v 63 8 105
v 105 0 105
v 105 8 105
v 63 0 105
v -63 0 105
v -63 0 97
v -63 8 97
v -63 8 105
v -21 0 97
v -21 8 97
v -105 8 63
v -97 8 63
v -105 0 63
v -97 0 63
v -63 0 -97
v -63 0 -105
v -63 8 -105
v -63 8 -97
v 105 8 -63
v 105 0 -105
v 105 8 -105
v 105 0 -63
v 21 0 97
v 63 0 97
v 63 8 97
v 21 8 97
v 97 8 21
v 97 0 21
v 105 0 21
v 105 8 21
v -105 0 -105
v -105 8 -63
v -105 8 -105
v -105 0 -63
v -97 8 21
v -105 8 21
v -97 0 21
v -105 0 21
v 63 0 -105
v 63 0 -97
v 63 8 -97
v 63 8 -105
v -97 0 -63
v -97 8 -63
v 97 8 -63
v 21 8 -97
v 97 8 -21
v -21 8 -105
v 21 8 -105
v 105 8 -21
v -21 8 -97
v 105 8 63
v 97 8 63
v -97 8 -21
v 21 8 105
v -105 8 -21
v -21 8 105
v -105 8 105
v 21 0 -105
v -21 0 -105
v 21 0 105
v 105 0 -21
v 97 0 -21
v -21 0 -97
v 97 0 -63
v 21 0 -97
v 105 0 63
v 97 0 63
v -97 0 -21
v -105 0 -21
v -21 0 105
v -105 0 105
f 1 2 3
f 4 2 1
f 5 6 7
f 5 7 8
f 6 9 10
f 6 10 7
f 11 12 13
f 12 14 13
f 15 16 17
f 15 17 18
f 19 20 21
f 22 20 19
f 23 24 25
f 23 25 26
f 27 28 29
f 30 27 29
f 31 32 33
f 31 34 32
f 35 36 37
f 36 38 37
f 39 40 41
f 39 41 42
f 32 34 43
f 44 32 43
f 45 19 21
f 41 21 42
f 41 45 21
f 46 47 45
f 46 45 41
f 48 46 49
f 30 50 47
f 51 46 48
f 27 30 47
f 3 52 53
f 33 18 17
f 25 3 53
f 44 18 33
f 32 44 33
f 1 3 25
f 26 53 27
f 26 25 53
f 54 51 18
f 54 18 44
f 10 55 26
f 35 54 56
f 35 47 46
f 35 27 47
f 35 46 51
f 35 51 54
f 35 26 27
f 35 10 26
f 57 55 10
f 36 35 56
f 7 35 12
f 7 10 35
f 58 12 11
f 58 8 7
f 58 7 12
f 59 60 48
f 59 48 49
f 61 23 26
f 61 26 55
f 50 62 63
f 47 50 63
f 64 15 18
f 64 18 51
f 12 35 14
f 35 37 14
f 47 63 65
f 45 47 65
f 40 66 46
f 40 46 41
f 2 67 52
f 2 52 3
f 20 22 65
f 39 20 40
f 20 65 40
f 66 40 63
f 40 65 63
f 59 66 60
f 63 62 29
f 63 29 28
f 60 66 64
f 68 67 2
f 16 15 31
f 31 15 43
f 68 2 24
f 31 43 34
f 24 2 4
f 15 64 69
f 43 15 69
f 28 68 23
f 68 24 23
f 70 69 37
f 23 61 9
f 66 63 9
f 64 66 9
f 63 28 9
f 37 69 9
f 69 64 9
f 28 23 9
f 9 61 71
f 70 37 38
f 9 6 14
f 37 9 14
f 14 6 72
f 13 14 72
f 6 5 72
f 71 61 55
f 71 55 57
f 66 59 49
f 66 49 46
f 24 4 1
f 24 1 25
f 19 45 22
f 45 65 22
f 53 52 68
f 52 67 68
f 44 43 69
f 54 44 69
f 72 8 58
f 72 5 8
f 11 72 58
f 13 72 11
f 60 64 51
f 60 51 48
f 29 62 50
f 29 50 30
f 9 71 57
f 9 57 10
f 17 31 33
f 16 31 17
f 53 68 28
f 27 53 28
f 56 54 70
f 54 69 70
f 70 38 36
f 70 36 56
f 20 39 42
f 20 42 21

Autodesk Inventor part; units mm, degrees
ref_plane "YZ Plane" through (0, 0, 0) normal (1, 0, 0) x (0, 1, 0)
ref_plane "XZ Plane" through (0, 0, 0) normal (0, 1, 0) x (-1, 0, 0)
ref_plane "XY Plane" through (0, 0, 0) normal (0, 0, 1) x (1, 0, 0)
sketch "Sketch2" plane through (0, 0, 0) normal (0, 1, 0) x (-1, 0, 0)
  line L0 (-105, 105) -> (105, 105)
  line L1 (105, 105) -> (105, -105)
  line L2 (105, -105) -> (-105, -105)
  line L3 (-105, -105) -> (-105, 105)
  line L4 (-105, 105) -> (105, -105) construction
  line L5 (105, 105) -> (-105, -105) construction
  point P0 (0, 0)
  dimension "d11" = 210
  dimension "d12" = 210
extrude "Extrusion2" add sketch "Sketch2" along normal blind 8
sketch "Sketch4" plane through (0, 0, 0) normal (0, -1, 0) x (1, 0, 0)
  line L0 (105, 105) -> (-105, 105) projected
  line L1 (-105, 105) -> (-105, -105) projected
  line L2 (-105, -105) -> (105, -105) projected
  line L3 (105, -105) -> (105, 105) projected
  line L4 (-105, -63) -> (-97, -63)
  line L5 (-97, -63) -> (-97, -21)
  line L6 (-97, -21) -> (-105, -21)
  line L7 (-105, -21) -> (-105, -63)
  line L8 (-105, 21) -> (-97, 21)
  line L9 (-97, 21) -> (-97, 63)
  line L10 (-97, 63) -> (-105, 63)
  line L11 (-105, 63) -> (-105, 21)
  line L12 (-97, -21) -> (-97, 21) construction
  line L13 (-97, 63) -> (-97, 105) construction
  line L14 (-97, -63) -> (-97, -105)
  point P0 (0, 0)
  dimension "d27" = 8
extrude "Extrusion3" cut sketch "Sketch4" against normal through all contours L10 L9 L8 L1 | L4 L1 L6 L5
sketch "Sketch5" plane through (0, 0, 0) normal (0, -1, 0) x (1, 0, 0)
  line L0 (-97, 21) -> (-105, 21) projected
  line L1 (-105, 21) -> (-105, -21) projected
  line L2 (-105, -21) -> (-97, -21) projected
  line L3 (-97, -21) -> (-97, -63) projected
  line L4 (-97, -63) -> (-105, -63) projected
  line L5 (-105, -63) -> (-105, -105) projected
  line L6 (-105, -105) -> (105, -105) projected
  line L7 (105, -105) -> (105, 105) projected
  line L8 (105, 105) -> (-105, 105) projected
  line L9 (-105, 105) -> (-105, 63) projected
  line L10 (-105, 63) -> (-97, 63) projected
  line L11 (-97, 63) -> (-97, 21) projected
  line L12 (63, -105) -> (21, -105)
  line L13 (21, -105) -> (21, -97)
  line L14 (21, -97) -> (63, -97)
  line L15 (63, -97) -> (63, -105)
  line L16 (-21, -105) -> (-63, -105)
  line L17 (-63, -105) -> (-63, -97)
  line L18 (-63, -97) -> (-21, -97)
  line L19 (-21, -97) -> (-21, -105)
  line L20 (63, -97) -> (105, -97) construction
  line L21 (21, -97) -> (-21, -97) construction
  line L22 (-63, -97) -> (-105, -97) construction
  point P0 (0, 0)
  dimension "d31" = 8
extrude "Extrusion4" cut sketch "Sketch5" against normal through all contours L6 L13 L14 L15 | L17 L18 L19 L6
mirror "Mirror1" about plane through (0, 0, 0) normal (1, 0, 0) of "Extrusion3"
mirror "Mirror2" about plane through (0, 0, 0) normal (0, 0, 1) of "Extrusion4"
equation "\"d11\" = d12"
properties part number "M01 - Base Top" material "Wood (Walnut)"
